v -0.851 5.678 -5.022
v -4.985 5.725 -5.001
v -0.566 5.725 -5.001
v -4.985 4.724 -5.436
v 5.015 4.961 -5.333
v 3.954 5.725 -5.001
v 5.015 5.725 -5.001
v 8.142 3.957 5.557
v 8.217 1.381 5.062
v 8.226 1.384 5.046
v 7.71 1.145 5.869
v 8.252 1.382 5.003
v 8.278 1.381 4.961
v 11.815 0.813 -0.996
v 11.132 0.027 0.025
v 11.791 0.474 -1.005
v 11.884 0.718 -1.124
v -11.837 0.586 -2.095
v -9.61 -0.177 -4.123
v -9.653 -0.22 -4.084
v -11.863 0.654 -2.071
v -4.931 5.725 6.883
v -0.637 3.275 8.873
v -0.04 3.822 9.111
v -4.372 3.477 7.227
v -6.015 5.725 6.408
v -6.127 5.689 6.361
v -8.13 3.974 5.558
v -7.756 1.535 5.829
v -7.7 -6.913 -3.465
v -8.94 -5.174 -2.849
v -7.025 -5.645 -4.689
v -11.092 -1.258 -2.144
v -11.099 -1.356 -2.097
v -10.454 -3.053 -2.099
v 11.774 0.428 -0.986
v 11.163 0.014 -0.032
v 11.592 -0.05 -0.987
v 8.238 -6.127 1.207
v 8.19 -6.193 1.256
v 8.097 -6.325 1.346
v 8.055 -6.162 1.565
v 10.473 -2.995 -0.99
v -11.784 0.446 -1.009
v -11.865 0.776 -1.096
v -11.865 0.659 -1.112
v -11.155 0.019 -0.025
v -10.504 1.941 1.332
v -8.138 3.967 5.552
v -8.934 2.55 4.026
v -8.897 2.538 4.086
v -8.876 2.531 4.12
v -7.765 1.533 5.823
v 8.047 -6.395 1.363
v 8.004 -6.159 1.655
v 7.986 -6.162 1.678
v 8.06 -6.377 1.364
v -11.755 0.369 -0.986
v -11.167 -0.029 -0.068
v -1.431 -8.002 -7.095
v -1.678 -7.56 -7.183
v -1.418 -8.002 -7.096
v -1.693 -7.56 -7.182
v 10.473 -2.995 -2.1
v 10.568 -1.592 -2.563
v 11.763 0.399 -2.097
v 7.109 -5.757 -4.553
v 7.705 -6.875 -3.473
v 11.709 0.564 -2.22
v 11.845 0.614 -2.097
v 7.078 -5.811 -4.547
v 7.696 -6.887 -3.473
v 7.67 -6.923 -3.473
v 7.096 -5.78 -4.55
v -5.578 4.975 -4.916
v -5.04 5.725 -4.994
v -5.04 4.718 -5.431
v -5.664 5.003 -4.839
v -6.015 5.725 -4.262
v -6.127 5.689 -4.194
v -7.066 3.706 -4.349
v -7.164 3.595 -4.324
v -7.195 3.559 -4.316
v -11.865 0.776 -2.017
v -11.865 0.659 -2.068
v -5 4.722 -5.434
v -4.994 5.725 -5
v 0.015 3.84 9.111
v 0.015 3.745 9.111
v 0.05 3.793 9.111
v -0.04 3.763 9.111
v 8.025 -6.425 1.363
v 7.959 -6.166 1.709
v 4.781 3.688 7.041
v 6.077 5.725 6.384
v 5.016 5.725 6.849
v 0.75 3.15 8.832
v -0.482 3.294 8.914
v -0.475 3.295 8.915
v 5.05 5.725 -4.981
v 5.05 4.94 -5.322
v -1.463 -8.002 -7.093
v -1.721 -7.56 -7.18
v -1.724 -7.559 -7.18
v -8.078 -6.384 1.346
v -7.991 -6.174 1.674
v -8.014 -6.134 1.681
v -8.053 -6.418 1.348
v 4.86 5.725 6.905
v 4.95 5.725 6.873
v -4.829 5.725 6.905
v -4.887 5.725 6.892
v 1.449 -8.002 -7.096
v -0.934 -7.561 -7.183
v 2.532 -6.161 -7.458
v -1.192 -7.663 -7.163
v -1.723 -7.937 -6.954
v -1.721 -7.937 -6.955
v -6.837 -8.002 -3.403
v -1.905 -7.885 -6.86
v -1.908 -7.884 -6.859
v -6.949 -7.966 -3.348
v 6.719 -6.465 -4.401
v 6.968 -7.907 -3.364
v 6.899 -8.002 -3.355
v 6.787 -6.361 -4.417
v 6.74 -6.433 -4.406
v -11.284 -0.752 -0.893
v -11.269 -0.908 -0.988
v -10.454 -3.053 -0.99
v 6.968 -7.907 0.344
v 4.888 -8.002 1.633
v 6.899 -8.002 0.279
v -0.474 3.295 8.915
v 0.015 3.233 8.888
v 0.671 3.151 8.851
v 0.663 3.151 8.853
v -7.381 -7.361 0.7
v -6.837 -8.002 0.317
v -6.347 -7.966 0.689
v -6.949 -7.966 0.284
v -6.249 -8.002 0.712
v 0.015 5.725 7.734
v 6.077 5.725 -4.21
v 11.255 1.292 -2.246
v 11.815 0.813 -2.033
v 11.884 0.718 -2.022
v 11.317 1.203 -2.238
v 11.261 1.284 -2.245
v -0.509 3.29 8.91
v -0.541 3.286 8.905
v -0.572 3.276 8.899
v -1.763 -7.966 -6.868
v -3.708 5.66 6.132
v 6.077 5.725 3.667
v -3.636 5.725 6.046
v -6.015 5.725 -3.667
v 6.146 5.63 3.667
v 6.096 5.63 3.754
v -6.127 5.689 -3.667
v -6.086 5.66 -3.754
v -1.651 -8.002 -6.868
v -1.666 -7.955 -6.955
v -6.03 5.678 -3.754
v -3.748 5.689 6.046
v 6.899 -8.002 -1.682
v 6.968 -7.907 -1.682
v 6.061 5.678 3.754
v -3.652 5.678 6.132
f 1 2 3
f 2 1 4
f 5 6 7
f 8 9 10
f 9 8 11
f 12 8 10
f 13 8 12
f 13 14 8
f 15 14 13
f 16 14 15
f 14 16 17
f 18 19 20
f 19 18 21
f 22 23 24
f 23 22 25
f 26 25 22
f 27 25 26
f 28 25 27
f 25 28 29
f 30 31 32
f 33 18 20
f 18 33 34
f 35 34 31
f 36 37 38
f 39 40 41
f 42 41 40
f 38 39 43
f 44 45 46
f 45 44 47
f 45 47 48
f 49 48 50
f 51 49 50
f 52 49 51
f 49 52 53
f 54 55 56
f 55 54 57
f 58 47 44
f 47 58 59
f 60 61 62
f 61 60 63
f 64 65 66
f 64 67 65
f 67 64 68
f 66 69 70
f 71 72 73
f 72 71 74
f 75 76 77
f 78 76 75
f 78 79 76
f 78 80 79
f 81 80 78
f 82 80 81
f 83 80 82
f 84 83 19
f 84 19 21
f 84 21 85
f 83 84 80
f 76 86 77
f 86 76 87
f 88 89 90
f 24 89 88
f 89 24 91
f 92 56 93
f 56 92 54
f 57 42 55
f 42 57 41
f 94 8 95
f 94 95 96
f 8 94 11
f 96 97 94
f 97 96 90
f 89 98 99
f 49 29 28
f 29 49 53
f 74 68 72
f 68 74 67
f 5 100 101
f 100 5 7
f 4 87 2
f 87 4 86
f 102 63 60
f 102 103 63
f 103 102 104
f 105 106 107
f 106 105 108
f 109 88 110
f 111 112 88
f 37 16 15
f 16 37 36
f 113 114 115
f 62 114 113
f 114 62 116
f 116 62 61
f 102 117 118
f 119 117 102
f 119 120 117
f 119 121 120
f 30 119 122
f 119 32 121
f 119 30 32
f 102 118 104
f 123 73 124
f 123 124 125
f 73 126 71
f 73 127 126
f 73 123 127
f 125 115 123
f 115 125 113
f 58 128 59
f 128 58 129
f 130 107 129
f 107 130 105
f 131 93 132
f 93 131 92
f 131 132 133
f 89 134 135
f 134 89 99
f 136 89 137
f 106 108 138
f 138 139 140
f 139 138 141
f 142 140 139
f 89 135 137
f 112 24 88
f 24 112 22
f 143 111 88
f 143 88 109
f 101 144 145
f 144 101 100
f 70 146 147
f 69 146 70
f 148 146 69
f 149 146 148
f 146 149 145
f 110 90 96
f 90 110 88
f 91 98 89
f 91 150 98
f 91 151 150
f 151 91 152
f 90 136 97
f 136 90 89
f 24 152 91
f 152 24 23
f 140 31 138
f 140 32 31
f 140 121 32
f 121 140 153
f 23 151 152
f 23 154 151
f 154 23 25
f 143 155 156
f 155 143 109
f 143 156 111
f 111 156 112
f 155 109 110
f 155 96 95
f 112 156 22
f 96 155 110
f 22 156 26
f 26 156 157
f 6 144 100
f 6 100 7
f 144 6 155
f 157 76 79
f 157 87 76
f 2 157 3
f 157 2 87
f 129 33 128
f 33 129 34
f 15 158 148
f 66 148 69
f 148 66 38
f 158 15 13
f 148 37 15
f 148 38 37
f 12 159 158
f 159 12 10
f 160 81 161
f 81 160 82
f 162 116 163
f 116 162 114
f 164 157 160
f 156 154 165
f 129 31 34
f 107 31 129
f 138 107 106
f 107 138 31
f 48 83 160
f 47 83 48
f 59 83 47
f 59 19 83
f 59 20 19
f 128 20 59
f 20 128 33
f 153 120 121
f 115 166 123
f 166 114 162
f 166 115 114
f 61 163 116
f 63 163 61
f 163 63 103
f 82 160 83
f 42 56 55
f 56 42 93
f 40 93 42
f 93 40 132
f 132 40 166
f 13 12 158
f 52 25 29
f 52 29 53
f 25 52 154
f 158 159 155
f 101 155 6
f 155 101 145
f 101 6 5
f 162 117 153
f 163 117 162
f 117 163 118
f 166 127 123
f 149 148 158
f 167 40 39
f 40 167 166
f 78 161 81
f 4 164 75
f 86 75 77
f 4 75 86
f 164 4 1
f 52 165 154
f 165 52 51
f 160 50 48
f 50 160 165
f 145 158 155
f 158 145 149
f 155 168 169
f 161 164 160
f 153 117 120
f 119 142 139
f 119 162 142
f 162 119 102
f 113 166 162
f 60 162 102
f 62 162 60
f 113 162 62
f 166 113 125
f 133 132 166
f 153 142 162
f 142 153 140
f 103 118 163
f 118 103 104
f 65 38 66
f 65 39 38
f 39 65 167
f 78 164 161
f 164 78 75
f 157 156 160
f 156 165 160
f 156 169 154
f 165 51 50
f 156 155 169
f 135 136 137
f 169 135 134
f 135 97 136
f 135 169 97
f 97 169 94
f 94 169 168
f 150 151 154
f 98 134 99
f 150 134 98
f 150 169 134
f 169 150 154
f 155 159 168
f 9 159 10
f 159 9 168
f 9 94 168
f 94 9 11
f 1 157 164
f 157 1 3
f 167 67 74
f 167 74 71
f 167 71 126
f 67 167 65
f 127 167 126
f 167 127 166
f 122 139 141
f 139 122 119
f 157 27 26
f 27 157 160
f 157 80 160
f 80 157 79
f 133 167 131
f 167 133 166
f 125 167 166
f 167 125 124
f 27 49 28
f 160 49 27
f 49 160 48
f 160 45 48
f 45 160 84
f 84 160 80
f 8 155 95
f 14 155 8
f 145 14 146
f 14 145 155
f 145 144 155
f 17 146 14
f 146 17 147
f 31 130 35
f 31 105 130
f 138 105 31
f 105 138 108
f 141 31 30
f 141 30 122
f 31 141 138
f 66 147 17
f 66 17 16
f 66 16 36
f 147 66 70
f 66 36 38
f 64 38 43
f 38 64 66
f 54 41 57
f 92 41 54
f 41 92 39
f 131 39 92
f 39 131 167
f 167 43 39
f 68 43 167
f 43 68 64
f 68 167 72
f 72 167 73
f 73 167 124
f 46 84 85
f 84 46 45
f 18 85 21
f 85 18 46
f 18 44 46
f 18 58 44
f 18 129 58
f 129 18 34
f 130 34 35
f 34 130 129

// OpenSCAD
// Auto-generated OpenSCAD file

    inner_points = 10*[[-0.2885376862918134, 0.07175899174657377, -1.1783945441115085], [0.28853768640082145, 0.07175900040332306, 1.1783945428274933], [-1.1783945434149965, 0.0717589960423746, 0.28853768570430977], [1.1783945435240049, 0.07175899610752223, -0.28853768698832505], [-1.037277726864703, -0.29945504957306746, -0.6292238173151442], [0.6292238183363167, -0.2994550495270012, -1.0372777266018605], [-0.6292238175779867, -0.29945504345182133, 1.0372777278858758], [1.037277727623033, -0.299455043405755, 0.6292238185991594], [-0.16817179443109592, -0.7907165367613447, -0.6868174750759801], [0.16817179604873278, -0.7907165317158302, 0.6868174797585049], [-0.686817476608424, -0.7907165342575728, 0.16817179758117676], [0.6868174782260609, -0.7907165342196021, -0.16817179289865195], [-0.6045687129127788, 0.5630204820268412, -0.366737881241974], [0.36673787852556217, 0.5630204820536906, -0.604568714878892], [-0.366737879275861, 0.5630204855945586, 0.6045687101963672], [0.6045687121624802, 0.563020485621408, 0.3667378765594492]];

    outer_points = 10*[[-1.213205545812953, 0.07387883237032282, -0.17027003437574006], [1.2132055459196738, 0.07387883237032282, -0.17027003361533383], [-9.797521174090613e-11, 1.186835379548445, 0.3126330832175659], [2.0469611576138433e-10, -1.0390777148077994, -0.6531731512086397], [-0.8578658686155681, 0.7131002893052931, 0.5117341025641999], [-0.8578658684015472, -0.8608579540459387, -0.17119403511081444], [0.8578658682948263, 0.7131002893052931, 0.5117341031018883], [0.8578658685088472, -0.8608579540459387, -0.17119403457312604], [-0.7071067813811416, -0.2694200616443975, 0.6209378460253994], [0.7071067809919536, -0.2694200616443975, 0.6209378464685957], [-2.827987185956705e-10, 0.3792574228569266, 0.9023939193757089], [-1.0638924793604034e-10, -0.9180975461457217, 0.33948177311828626], [-0.49999999986777616, 0.7281043097383153, -0.42191834848824256], [-0.49999999974303583, -0.1892641864495203, -0.8199573443191398], [0.5000000001322238, 0.7281043097383153, -0.42191834817485535], [0.5000000002569641, -0.1892641864495203, -0.8199573440057525]];

    // Convex hull for inner set (I)
    module inner_hull() {
        hull() {
            for (p = inner_points) {
                translate(p) sphere(r=0.1);
            }
        }
    }

    // Convex hull for outer set (O) minus inner hull (O \ I)
    module outer_minus_inner() {
        difference() {
            hull() {
                for (p = outer_points) {
                    translate(p) sphere(r=0.1);
                }
            }
            inner_hull(); // Subtract inner hull
        }
    }

    // Convex hull for outer set (O) minus all translated inner hulls
    module outer_minus_AllTranslationInner() {
        difference() {
            hull() {
                for (p = outer_points) {
                    translate(p) sphere(r=0.1);
                }
            }
            hull() {
                translate([0,0,50]) inner_hull();
                translate([0,0,-50]) inner_hull();
            }; // Subtract translated inner hulls
        }
    }

    // Difference between outer_minus_inner and outer_minus_AllTranslationInner
    module outer_minus_inner_diff() {
        difference() {
            // Outer minus inner
            difference() {
                hull() {
                    for (p = outer_points) {
                        translate(p) sphere(r=0.1);
                    }
                }
                inner_hull();
            }

            // Subtract Outer minus AllTranslationInner
            difference() {
                hull() {
                    for (p = outer_points) {
                        translate(p) sphere(r=0.1);
                    }
                }
                hull() {
                    translate([0,0,50]) inner_hull();
                    translate([0,0,-50]) inner_hull();
                };
            }
        }
    }

    // Rendering all with colors applied
    color([1, 1, 0, 1]) outer_minus_inner_diff(); // Opaque yellow
    
